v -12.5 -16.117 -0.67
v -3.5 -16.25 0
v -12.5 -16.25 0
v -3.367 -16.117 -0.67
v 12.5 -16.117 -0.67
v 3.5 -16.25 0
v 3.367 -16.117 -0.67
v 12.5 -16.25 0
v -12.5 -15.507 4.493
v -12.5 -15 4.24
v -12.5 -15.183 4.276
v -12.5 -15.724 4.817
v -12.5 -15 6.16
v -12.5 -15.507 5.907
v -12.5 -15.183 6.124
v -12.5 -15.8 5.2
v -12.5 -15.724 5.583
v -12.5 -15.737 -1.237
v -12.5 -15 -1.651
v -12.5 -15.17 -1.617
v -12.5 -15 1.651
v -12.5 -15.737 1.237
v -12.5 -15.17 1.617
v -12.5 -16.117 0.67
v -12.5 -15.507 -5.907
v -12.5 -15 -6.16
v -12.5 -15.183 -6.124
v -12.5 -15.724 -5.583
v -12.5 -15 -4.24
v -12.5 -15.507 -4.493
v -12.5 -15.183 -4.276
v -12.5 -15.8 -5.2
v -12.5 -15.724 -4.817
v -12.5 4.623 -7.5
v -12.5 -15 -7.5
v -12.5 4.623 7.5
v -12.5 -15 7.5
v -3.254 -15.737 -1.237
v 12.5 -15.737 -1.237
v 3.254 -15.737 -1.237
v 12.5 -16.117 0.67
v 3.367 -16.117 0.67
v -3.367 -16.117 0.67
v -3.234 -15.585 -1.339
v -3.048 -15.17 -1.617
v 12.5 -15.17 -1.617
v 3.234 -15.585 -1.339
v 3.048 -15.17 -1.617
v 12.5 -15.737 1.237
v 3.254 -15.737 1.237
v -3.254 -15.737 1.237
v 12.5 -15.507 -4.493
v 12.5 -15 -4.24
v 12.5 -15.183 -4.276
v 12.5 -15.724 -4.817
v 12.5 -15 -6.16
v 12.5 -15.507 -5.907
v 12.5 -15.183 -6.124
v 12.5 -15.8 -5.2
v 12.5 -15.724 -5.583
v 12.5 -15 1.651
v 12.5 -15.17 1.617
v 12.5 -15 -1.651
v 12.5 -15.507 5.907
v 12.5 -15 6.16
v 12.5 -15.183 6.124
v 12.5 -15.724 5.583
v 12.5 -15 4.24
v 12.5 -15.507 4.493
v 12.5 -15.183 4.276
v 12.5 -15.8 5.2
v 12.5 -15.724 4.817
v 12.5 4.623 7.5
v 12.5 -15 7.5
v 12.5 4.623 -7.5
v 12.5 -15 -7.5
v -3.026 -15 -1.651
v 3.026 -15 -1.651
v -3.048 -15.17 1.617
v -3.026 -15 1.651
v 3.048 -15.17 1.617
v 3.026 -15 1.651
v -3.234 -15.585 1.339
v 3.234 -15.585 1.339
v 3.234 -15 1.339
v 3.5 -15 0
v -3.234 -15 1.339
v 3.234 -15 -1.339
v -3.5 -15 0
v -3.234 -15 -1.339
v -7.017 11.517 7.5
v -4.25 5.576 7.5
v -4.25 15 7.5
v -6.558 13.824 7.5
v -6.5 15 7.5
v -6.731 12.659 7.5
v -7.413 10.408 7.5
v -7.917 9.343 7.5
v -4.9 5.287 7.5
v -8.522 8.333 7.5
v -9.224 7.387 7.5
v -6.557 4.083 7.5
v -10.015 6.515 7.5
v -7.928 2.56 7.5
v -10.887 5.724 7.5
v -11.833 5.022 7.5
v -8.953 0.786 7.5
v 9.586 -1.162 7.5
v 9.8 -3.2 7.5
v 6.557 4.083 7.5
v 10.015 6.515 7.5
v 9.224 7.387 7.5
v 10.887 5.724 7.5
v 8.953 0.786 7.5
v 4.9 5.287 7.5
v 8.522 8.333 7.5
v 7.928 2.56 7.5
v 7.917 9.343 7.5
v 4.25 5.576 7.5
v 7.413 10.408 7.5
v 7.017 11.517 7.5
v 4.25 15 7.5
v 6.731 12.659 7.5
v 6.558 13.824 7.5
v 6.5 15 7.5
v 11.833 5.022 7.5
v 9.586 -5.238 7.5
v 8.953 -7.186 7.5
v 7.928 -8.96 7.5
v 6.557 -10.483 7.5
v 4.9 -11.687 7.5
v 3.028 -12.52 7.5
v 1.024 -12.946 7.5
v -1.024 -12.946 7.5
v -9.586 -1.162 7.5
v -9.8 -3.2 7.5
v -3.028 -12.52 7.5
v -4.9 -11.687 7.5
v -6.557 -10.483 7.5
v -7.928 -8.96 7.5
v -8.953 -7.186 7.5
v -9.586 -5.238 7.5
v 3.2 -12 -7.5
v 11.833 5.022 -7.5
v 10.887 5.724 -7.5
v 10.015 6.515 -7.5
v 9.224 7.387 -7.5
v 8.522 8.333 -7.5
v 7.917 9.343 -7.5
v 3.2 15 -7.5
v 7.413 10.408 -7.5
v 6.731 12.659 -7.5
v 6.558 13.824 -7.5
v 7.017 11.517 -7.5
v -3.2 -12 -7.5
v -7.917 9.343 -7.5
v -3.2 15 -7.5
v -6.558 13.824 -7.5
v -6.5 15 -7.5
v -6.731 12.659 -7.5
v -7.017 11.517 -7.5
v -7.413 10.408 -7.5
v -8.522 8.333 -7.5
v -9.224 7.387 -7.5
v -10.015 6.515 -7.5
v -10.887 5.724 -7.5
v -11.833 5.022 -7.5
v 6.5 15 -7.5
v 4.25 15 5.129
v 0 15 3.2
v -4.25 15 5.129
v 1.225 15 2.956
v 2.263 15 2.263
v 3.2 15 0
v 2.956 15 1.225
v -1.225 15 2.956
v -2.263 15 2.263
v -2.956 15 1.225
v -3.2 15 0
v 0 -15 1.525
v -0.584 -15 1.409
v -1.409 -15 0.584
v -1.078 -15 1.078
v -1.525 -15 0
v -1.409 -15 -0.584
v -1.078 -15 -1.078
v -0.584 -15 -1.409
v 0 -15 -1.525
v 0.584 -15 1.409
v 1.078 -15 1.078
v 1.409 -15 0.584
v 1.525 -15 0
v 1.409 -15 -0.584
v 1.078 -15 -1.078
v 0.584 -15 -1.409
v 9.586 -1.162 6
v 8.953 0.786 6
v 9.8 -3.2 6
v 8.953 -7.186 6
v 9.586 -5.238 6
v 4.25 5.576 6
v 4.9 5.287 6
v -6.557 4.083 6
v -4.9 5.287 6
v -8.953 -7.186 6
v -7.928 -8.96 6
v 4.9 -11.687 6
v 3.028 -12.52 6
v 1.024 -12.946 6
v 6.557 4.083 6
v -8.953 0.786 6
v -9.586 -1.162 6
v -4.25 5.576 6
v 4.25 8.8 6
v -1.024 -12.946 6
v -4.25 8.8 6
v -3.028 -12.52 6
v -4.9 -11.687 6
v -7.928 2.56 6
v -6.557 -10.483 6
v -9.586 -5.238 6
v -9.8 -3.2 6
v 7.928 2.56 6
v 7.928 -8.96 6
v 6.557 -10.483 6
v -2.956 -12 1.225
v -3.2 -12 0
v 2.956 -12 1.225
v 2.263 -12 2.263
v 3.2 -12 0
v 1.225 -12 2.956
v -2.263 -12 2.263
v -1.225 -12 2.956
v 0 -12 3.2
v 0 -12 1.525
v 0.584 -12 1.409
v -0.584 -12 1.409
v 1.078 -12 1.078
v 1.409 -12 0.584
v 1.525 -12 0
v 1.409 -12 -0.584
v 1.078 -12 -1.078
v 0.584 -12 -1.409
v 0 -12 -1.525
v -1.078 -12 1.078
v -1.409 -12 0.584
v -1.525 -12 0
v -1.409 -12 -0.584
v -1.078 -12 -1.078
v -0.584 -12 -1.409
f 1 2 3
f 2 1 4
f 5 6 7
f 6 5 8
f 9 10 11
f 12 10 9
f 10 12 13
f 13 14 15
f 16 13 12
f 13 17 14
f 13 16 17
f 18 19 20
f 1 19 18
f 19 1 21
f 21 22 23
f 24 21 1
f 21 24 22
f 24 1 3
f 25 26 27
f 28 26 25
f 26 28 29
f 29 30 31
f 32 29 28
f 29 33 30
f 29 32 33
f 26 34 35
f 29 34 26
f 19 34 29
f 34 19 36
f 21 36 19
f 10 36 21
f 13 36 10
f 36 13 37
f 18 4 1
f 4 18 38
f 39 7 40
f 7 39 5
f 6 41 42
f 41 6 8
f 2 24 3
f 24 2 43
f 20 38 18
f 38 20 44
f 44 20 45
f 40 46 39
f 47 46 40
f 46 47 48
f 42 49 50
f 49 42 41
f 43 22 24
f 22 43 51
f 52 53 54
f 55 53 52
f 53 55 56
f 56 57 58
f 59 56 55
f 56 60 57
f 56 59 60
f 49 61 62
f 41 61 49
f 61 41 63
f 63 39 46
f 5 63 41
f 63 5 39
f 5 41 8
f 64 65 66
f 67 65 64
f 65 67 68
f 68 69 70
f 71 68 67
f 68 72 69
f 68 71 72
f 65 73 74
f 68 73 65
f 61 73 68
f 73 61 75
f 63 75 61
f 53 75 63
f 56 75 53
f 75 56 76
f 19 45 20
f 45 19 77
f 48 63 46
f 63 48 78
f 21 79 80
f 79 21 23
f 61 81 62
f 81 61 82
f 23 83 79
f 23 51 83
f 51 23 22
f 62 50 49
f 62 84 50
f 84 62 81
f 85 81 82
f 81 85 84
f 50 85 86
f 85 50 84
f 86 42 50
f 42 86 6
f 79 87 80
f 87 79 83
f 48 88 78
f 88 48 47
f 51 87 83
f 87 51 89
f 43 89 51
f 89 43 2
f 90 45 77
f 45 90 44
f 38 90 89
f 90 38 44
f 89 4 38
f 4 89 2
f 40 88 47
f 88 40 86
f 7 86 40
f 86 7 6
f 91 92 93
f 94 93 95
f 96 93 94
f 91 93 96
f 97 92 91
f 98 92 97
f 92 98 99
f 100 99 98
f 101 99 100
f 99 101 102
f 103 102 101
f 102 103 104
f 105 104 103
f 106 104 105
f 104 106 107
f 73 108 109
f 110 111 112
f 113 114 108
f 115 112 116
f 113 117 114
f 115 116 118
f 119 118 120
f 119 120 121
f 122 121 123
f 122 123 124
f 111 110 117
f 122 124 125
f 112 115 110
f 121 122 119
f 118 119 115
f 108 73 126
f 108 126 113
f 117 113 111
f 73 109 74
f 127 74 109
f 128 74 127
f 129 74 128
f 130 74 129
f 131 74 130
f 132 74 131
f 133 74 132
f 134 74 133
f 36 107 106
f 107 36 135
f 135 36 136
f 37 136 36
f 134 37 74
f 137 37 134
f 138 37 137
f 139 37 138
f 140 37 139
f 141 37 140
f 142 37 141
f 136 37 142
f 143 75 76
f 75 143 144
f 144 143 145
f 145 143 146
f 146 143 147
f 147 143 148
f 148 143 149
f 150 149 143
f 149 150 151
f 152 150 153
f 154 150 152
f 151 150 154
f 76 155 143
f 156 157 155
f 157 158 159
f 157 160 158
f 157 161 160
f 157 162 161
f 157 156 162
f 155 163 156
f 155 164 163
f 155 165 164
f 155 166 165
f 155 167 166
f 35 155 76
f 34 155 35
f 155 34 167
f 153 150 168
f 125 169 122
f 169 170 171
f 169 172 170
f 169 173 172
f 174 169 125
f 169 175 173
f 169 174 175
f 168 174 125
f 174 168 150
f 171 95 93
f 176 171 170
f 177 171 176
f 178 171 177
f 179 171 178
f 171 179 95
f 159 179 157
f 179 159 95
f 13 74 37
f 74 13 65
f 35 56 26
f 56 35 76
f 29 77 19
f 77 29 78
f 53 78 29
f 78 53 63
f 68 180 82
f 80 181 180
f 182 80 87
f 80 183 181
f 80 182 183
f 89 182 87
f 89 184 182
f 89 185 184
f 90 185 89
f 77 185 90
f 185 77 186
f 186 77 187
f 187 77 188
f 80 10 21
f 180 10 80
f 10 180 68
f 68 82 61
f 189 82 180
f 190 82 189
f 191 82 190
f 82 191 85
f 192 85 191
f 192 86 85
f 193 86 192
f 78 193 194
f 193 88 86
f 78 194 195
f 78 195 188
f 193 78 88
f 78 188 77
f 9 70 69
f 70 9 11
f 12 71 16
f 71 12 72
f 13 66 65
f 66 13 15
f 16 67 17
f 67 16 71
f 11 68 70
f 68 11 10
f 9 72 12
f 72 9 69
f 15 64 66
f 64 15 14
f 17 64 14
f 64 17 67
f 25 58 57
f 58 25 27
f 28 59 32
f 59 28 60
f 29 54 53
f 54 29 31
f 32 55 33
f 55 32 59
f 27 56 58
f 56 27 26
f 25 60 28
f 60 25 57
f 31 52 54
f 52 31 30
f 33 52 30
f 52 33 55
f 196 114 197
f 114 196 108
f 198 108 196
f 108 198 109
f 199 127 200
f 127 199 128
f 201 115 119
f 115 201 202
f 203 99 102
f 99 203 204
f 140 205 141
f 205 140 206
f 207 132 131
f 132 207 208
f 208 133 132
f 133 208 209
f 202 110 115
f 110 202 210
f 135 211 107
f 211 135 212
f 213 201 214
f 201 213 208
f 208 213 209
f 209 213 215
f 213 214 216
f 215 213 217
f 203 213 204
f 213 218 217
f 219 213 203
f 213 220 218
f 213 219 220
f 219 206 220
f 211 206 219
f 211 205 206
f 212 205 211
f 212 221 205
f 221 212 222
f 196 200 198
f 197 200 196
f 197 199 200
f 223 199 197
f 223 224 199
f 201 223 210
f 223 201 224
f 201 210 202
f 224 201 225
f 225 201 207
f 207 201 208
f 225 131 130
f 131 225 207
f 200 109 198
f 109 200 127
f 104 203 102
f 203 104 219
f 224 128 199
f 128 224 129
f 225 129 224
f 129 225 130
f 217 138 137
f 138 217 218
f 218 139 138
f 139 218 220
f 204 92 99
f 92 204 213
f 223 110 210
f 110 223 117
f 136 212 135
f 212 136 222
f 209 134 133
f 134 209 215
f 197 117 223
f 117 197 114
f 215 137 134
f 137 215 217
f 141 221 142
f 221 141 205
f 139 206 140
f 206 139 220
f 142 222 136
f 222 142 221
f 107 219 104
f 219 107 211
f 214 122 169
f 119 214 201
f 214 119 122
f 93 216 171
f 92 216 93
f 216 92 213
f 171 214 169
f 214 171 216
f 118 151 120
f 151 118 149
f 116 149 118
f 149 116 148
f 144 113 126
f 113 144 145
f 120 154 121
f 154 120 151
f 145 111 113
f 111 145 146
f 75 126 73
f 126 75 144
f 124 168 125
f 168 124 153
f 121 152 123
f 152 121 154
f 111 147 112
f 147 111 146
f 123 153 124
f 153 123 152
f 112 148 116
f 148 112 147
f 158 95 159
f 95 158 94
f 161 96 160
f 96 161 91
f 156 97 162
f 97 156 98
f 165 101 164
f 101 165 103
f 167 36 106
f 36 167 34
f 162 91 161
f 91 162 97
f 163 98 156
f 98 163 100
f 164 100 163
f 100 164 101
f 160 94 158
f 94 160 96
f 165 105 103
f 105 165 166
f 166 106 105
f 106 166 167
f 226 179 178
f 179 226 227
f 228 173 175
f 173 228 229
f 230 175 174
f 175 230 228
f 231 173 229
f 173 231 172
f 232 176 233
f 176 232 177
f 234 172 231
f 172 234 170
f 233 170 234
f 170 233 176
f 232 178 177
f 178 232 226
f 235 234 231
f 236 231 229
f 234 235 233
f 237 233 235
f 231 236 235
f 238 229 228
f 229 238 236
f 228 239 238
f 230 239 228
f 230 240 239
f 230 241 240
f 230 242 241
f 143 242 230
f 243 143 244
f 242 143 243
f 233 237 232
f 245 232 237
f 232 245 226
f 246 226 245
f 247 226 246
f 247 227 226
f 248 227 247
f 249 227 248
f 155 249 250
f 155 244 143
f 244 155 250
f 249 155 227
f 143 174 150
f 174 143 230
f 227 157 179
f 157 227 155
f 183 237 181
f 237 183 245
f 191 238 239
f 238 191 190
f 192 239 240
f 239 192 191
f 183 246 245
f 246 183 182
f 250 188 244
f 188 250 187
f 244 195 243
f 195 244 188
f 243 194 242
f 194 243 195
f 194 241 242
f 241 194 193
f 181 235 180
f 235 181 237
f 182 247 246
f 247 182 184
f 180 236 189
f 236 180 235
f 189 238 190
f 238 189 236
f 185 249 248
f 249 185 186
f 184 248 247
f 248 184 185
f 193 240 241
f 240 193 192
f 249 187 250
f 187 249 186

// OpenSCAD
// file: extrusion.scad
include <configuration.scad>;

module extrusion_cutsection(){
	import("openbeam.dxf", convexity = 8);
}


module extrusion(h){
	linear_extrude(height = h){
		extrusion_cutsection();
	}
}

extrusion(300);
// file: configuration.scad
// Increase this if your slicer or printer make holes too tight.
extra_radius = 0.1;
extra_extrusion_width = 0.5;

// OD = outside diameter, corner to corner.
m3_nut_od = 6.1;
m3_nut_radius = m3_nut_od/2 + 0.35 + extra_radius;
m3_washer_radius = 3.5 + extra_radius;

// Major diameter of metric 3mm thread.
m3_major = 2.85;
m3_radius = m3_major/2 + extra_radius;
m3_wide_radius = m3_major/2 + extra_radius;

// NEMA17 stepper motors.
motor_shaft_diameter = 5;
motor_shaft_radius = motor_shaft_diameter/2 + extra_radius;

// Frame brackets. M3x8mm screws work best with 3.6 mm brackets.
thickness = 3.6;

// OpenBeam or Misumi. Currently only 15x15 mm, but there is a plan
// to make models more parametric and allow 20x20 mm in the future.
extrusion = 15;

// Placement for the NEMA17 stepper motors.
motor_offset = 44;
motor_length = 47;
// main file
include <configuration.scad>;
use <extrusion.scad>;

fsr_radius = 9.8;
fsr_recess = 1.5;
fsr_connector_width = 8.5;

module fsr_cutout(){
	translate([0,fsr_radius,0]) cylinder(r=fsr_radius, h=10);
	translate([-fsr_connector_width/2,fsr_radius,0]) cube([fsr_connector_width,100,10]);	
	translate([-fsr_connector_width/2,fsr_radius+12,0]) rotate([-8,0,0]) cube([fsr_connector_width,100,10]);	
}

module fsr_holder(width, length, height){
	difference(){
		union(){
			cube([width,length,height], center = true);
			translate([0,-(length/2)+0.2,(height/2)-2.3]) rotate([0,90,0])
				cylinder(r = 1.0, h = width, $fn = 16, center = true);
			translate([0,-(length/2)+0.2,-(height/2)+2.3]) rotate([0,90,0]) 
				cylinder(r = 1.0, h = width, $fn = 16, center = true);
			difference(){
				translate([-width/2,(-length/2)+0.5,0]) rotate([0,90,0])
					cylinder(r = 1.75, h = width, $fn = 16);
				rotate([90,0,0]) cylinder(r = 3.5, h = length*2, center = true, $fn = 16);
			}
		}
		translate([0,(-length/2)+2,(height/2)-fsr_recess]) fsr_cutout();
		translate([6+width/2,length/2,0]) cylinder(r = 12, h = height+2, center = true, $fn = 64);
		translate([-6-width/2,length/2,0]) cylinder(r = 12, h = height+2, center = true, $fn = 64);
		translate([0,3,0]) rotate([90,0,0]) cylinder(r = 3.2, h = length, center = true, $fn = 16);
		translate([0,3,-(height/4+0.5)]) cube([6.4,length,1+height/2], center = true);
		rotate([90,0,0]) cylinder(r = m3_wide_radius, h = length*2, center = true, $fn = 16);
	}
}

//translate([-150,-(7.5+15),0])rotate([0,90,0]) extrusion(300);

fsr_holder(25, 30, extrusion);
